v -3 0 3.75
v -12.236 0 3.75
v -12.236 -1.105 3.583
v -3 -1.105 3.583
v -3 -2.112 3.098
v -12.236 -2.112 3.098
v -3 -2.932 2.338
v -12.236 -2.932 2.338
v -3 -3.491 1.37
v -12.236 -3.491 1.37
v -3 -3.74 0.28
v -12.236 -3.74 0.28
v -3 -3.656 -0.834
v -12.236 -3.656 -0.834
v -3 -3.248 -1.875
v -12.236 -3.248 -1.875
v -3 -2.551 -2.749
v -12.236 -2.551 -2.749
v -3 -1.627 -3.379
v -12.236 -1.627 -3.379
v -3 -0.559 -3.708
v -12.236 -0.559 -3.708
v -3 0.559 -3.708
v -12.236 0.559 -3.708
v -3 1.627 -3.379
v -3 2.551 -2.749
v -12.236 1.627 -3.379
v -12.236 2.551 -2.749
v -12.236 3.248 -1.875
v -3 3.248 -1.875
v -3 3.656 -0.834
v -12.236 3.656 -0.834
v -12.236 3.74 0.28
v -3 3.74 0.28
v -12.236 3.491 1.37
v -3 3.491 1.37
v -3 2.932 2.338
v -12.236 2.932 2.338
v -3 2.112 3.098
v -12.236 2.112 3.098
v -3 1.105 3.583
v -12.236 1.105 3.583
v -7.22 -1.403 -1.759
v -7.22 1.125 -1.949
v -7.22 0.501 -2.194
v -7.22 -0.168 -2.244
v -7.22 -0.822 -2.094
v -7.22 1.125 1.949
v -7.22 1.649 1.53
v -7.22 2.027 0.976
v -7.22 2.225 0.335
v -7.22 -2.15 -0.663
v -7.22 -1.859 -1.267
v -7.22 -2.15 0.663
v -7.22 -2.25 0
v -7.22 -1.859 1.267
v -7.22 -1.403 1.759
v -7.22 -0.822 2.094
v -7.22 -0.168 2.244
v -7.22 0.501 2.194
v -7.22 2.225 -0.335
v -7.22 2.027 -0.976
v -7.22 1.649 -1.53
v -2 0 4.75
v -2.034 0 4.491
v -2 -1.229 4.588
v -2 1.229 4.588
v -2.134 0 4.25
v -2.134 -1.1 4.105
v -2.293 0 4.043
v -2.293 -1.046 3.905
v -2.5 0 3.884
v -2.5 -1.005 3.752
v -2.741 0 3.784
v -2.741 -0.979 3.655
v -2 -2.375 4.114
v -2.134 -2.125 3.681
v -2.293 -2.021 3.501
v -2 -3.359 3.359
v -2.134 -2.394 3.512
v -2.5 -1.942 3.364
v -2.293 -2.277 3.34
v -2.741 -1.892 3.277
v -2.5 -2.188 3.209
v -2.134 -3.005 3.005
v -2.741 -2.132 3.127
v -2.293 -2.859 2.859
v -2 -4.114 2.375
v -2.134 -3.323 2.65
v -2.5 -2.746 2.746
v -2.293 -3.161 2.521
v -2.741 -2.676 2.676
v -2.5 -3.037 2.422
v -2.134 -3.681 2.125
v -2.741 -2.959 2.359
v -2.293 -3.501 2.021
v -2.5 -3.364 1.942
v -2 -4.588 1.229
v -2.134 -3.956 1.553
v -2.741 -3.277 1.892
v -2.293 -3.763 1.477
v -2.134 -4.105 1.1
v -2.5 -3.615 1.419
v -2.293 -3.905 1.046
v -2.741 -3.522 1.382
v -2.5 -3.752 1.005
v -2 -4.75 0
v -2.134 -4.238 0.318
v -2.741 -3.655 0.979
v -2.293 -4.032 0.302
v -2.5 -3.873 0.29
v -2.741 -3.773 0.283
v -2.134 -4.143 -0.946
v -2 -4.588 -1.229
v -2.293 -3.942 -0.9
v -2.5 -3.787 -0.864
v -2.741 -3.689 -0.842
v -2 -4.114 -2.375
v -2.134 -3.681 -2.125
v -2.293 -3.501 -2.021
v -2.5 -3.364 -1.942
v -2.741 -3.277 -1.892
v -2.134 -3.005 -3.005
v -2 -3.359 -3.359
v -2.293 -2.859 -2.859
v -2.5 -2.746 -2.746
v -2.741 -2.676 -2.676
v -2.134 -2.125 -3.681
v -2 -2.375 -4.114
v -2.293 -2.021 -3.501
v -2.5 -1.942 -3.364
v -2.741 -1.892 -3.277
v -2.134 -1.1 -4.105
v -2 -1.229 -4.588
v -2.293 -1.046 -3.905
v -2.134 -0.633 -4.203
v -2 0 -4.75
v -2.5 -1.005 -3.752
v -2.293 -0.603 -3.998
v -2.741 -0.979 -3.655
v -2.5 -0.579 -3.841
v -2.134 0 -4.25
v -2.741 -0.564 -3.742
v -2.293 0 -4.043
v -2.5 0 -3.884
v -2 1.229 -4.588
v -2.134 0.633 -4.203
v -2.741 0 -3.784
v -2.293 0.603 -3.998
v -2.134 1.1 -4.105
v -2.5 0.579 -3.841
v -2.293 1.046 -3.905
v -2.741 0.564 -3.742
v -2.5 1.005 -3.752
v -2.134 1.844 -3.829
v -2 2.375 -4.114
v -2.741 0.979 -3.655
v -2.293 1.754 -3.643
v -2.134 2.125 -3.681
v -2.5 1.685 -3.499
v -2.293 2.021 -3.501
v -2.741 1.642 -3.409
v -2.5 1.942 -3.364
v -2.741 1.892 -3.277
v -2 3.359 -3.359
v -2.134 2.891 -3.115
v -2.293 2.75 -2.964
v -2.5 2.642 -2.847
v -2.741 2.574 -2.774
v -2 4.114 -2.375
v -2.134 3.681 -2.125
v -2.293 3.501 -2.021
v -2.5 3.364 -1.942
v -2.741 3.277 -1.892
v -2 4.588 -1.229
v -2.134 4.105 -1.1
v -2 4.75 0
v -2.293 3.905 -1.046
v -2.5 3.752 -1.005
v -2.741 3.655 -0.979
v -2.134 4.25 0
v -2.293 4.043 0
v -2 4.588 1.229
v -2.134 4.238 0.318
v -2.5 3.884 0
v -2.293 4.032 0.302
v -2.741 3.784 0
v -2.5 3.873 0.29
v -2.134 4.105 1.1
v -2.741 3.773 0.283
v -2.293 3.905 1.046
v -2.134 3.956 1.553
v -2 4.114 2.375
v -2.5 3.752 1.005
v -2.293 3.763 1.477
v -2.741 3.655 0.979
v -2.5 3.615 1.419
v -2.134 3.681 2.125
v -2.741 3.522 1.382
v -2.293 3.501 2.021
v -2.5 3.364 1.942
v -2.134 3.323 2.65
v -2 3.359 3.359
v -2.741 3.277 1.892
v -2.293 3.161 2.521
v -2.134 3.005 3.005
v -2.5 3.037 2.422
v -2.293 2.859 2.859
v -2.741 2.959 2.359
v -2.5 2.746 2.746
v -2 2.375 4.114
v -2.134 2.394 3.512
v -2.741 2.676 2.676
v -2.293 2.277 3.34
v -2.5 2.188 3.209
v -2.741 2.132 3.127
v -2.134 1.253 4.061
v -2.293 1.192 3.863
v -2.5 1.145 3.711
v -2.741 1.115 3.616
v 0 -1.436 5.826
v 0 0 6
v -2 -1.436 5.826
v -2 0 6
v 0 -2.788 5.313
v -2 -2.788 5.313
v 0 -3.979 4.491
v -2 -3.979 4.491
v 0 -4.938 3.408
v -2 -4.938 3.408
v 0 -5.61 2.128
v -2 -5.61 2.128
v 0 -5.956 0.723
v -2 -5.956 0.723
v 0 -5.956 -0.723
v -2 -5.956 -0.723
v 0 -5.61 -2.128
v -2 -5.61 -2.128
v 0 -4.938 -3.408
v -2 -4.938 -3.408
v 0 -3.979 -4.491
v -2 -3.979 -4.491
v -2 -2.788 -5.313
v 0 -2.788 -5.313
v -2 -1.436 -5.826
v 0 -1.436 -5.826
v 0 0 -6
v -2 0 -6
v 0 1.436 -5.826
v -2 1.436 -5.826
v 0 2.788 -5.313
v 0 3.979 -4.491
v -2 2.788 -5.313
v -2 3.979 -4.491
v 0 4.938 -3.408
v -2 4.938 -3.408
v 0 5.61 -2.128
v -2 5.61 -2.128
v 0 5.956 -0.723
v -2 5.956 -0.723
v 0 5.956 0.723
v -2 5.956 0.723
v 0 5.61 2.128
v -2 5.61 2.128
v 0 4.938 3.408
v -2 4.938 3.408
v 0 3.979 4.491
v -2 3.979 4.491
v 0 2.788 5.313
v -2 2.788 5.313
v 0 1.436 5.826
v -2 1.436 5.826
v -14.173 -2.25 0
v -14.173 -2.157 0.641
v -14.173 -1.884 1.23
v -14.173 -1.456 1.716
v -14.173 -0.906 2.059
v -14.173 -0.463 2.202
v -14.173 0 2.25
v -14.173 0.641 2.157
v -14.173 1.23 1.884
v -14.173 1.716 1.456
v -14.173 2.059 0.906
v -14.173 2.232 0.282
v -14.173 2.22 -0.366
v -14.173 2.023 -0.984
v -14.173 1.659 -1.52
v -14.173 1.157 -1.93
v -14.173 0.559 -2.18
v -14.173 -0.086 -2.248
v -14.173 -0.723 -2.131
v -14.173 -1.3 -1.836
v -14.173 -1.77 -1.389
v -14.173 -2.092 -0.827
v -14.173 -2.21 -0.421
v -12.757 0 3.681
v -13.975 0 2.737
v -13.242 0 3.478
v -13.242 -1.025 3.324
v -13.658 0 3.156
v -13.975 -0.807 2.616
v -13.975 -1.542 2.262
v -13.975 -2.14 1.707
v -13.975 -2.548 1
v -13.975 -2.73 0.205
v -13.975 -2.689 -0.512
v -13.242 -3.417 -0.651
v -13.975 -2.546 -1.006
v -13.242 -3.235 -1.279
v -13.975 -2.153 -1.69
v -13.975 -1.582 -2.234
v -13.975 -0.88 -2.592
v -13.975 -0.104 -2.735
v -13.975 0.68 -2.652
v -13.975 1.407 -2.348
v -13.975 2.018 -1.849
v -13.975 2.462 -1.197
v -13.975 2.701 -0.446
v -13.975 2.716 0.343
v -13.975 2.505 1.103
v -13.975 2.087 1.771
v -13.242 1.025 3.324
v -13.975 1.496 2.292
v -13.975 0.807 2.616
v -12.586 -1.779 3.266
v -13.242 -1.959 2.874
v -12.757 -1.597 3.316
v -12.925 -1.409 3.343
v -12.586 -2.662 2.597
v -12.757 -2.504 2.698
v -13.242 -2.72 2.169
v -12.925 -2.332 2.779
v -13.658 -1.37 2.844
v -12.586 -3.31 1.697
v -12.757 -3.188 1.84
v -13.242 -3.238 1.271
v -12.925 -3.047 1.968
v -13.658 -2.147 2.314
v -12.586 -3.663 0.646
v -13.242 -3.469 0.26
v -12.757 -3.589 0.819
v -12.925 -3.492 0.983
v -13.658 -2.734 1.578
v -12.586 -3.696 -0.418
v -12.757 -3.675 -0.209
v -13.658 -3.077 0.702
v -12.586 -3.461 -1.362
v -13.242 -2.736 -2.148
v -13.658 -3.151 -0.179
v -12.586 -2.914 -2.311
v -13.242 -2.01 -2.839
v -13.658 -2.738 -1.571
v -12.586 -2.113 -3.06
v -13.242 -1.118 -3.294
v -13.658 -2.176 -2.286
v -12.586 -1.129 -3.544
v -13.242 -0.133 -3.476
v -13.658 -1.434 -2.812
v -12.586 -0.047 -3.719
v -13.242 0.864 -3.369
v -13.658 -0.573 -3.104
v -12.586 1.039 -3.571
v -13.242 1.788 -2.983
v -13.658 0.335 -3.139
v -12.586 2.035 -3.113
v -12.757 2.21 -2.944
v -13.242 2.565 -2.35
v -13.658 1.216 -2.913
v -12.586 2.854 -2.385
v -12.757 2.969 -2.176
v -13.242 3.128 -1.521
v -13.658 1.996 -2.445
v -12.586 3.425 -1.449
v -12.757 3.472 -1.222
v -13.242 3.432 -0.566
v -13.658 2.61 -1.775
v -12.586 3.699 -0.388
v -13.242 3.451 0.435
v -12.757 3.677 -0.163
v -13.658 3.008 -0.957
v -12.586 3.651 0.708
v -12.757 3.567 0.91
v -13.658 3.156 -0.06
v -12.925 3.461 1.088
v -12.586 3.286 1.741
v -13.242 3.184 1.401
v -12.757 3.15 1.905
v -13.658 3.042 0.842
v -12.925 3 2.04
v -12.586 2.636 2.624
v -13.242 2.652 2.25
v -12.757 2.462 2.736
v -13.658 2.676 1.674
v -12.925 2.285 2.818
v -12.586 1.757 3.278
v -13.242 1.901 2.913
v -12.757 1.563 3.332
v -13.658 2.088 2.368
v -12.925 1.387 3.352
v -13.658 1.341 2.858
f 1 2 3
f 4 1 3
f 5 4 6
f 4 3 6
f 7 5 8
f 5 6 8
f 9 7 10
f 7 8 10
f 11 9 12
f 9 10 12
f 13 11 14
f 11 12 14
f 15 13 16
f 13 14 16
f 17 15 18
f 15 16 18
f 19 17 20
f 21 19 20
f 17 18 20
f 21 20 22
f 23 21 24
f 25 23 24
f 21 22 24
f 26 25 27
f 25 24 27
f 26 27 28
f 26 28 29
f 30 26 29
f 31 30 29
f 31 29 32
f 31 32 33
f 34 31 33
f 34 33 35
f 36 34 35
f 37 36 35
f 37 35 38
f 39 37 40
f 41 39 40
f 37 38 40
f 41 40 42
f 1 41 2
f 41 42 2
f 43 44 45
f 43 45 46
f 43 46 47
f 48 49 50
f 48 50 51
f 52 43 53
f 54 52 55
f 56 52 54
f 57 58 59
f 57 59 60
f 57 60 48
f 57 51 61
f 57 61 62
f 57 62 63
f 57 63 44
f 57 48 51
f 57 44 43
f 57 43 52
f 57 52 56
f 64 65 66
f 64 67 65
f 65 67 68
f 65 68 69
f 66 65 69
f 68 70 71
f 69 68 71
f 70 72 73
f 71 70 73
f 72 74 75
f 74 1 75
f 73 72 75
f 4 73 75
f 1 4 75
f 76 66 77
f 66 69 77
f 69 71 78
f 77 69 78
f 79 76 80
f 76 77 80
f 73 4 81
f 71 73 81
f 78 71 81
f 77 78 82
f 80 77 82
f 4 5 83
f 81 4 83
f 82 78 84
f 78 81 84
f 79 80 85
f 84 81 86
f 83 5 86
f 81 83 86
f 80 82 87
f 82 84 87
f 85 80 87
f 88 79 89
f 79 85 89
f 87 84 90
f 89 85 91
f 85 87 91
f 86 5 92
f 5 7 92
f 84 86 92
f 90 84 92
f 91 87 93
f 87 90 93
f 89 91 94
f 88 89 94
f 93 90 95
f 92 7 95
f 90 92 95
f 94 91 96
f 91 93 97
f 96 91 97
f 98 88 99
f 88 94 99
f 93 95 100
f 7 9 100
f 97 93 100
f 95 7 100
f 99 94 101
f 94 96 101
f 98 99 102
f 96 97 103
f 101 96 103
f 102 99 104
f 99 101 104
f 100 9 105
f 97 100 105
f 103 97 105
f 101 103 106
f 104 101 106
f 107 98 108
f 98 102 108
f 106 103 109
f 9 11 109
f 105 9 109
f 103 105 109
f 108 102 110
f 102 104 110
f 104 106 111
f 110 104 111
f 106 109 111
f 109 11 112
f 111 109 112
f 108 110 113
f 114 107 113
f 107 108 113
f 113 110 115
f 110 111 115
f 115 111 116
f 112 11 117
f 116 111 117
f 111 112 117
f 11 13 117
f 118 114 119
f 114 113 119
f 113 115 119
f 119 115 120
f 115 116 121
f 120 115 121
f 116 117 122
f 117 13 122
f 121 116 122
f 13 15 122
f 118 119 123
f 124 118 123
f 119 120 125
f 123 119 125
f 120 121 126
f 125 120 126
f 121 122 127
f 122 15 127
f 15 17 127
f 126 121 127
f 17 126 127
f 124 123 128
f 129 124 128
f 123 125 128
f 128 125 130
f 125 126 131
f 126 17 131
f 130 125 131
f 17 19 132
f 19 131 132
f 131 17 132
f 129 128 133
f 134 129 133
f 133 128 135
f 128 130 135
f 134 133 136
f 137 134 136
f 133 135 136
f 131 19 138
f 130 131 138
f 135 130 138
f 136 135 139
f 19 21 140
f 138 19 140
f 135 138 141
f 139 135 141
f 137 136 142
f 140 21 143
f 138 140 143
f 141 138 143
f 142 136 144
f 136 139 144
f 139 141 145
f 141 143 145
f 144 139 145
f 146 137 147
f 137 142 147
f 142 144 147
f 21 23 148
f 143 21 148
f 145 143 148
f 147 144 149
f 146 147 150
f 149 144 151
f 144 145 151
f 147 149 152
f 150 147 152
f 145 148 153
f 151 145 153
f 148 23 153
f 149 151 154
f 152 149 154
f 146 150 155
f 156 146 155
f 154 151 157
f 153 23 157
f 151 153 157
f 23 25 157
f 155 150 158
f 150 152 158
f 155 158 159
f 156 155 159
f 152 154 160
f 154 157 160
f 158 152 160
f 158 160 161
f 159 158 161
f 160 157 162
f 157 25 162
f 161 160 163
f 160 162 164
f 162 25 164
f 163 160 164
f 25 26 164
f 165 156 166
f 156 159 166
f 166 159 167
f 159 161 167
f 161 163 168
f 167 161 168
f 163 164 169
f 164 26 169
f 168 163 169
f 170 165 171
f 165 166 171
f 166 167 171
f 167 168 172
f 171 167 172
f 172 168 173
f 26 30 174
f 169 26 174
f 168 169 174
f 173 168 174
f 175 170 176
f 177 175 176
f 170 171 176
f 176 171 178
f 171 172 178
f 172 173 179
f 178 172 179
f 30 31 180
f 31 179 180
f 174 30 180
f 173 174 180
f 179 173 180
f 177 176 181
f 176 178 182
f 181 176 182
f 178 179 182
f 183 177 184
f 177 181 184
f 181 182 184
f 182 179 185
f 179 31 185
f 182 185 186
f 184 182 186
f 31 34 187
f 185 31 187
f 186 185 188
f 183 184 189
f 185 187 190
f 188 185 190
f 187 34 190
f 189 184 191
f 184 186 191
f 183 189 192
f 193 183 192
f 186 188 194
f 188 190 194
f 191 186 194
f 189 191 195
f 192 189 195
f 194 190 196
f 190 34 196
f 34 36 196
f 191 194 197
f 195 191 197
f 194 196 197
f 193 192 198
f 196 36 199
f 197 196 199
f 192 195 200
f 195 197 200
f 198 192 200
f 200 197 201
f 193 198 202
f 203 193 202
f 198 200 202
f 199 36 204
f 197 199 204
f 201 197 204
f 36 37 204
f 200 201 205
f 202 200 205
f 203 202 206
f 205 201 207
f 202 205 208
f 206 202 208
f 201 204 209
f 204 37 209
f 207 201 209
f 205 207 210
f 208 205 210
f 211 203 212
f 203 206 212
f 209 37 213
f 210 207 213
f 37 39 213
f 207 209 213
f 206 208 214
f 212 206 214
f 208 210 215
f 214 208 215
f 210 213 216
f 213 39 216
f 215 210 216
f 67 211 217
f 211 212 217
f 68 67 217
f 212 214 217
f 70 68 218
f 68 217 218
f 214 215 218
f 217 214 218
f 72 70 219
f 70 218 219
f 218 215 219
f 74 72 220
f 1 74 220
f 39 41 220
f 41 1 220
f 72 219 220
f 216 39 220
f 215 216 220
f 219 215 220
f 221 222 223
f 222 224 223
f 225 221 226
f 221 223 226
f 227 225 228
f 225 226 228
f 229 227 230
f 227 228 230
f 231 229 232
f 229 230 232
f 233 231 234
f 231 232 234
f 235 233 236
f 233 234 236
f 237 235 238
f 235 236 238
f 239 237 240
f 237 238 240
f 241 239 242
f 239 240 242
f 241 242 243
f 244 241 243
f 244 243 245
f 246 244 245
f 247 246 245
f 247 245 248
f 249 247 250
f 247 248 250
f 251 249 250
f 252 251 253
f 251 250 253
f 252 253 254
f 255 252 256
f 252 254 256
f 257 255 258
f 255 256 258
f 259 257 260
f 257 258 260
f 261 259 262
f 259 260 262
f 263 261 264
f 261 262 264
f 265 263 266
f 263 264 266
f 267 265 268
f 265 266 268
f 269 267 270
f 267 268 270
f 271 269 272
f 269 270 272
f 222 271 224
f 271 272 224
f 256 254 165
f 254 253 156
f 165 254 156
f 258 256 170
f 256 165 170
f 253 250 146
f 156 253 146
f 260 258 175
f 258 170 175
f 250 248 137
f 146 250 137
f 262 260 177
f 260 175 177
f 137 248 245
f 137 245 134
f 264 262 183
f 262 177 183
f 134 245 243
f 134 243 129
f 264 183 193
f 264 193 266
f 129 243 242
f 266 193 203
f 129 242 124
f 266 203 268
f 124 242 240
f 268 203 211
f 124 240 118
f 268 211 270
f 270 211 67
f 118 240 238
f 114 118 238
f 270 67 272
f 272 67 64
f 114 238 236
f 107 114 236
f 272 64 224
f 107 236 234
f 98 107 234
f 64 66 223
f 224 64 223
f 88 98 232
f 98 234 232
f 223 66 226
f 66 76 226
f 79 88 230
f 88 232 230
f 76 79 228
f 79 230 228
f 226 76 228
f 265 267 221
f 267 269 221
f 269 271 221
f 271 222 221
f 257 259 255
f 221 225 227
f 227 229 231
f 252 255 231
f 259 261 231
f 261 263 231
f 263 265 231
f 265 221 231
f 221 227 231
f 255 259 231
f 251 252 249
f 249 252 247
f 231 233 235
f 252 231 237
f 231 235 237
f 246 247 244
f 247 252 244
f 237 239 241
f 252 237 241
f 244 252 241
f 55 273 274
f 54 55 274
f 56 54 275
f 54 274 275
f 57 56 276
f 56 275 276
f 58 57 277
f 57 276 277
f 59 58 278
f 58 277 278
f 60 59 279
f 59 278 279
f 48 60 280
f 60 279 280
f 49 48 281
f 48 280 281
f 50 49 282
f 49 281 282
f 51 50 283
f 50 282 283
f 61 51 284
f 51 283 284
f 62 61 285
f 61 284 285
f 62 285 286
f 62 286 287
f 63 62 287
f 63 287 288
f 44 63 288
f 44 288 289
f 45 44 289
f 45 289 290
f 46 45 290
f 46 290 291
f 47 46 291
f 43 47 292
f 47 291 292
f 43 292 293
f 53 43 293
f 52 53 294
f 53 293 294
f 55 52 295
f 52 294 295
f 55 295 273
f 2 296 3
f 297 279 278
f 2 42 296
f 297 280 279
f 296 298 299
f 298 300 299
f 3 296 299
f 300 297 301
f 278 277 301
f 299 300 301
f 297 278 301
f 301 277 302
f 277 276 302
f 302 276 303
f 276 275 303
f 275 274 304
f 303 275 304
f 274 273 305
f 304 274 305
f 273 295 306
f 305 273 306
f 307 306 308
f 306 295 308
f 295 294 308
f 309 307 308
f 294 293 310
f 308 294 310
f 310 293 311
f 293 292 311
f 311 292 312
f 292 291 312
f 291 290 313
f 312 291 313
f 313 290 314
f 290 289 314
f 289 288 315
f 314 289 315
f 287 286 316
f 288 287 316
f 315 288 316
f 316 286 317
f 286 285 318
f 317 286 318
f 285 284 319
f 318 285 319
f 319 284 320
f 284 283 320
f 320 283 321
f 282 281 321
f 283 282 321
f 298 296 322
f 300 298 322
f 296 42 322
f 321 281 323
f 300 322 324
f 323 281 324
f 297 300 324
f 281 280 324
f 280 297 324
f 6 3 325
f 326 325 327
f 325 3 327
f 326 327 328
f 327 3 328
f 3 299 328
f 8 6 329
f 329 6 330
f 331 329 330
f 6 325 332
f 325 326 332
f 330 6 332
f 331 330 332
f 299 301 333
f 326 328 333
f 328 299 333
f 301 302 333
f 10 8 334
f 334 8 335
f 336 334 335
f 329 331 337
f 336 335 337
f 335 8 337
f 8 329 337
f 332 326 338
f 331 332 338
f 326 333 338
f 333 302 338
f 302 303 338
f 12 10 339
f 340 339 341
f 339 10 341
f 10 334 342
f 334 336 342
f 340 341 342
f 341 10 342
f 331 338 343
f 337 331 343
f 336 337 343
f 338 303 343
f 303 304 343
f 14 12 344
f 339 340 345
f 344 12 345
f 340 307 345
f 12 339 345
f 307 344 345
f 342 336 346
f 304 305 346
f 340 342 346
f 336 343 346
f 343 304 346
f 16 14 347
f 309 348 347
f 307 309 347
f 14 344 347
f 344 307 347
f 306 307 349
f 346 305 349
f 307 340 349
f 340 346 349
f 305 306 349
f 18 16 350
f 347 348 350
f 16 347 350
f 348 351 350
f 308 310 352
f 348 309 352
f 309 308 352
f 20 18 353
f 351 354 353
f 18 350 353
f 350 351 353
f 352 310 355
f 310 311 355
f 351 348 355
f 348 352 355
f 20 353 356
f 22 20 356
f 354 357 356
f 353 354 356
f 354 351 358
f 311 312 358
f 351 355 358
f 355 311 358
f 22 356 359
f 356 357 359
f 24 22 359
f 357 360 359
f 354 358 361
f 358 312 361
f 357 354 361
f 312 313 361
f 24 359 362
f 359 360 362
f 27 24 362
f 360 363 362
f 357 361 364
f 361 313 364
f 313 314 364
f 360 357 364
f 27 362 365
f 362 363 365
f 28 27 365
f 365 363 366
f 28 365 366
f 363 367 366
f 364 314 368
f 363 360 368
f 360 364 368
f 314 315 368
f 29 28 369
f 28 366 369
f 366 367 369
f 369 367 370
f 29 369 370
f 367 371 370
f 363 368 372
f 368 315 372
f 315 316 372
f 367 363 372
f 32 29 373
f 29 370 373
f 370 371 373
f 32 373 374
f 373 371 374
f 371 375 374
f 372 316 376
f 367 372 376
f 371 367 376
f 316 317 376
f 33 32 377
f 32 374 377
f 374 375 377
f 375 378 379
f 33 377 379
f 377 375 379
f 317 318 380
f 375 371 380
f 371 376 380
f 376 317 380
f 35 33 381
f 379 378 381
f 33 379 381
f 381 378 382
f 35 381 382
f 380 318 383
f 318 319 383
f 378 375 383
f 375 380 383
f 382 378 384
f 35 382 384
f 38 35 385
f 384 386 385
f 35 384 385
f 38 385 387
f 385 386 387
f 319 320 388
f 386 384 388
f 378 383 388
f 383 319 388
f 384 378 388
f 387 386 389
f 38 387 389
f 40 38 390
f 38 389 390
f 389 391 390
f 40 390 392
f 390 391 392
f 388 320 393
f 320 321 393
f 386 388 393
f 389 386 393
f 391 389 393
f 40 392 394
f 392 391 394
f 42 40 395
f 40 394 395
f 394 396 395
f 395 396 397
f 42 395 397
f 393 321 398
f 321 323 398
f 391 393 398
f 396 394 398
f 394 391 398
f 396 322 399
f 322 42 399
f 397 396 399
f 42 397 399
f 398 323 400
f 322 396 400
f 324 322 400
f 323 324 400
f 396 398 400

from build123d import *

# Parameters (mm, degrees)
F2_R     = 1
F3_R     = 2.25
F4_DEPTH = 7


with BuildPart() as f1:
    # F0 (on Front) → F1 (revolve)
    with BuildSketch(Plane.XZ):
        with BuildLine():
            Line((-14.220479, 0), (0, 0))
            Line((0, 0), (0, 6))
            Line((0, 6), (-2, 6))
            Line((-2, 6), (-2, 3.75))
            Line((-2, 3.75), (-11, 3.75))
            Line((-11, 3.75), (-12.236166, 3.75))
            ThreePointArc((-12.236166, 3.75), (-13.559041, 3.25), (-14.220479, 2))
            Line((-14.220479, 2), (-14.220479, 0))
        make_face()
    revolve(axis=Axis((-7.11024, 0, 0), (1, 0, 0)))

    # F2
    f2_edges = [f1.edges().sort_by_distance(p)[0] for p in [
        (-2, 0, -3.75),
    ]]
    fillet(f2_edges, radius=F2_R)

    # F3 (on face) → F4 (cut)
    with BuildSketch(Plane(origin=(-14.220479, 0, 0), x_dir=(0, -1, 0), z_dir=(-1, 0, 0))):
        Circle(F3_R)
    extrude(amount=-F4_DEPTH, mode=Mode.SUBTRACT)


solid = f1.part
